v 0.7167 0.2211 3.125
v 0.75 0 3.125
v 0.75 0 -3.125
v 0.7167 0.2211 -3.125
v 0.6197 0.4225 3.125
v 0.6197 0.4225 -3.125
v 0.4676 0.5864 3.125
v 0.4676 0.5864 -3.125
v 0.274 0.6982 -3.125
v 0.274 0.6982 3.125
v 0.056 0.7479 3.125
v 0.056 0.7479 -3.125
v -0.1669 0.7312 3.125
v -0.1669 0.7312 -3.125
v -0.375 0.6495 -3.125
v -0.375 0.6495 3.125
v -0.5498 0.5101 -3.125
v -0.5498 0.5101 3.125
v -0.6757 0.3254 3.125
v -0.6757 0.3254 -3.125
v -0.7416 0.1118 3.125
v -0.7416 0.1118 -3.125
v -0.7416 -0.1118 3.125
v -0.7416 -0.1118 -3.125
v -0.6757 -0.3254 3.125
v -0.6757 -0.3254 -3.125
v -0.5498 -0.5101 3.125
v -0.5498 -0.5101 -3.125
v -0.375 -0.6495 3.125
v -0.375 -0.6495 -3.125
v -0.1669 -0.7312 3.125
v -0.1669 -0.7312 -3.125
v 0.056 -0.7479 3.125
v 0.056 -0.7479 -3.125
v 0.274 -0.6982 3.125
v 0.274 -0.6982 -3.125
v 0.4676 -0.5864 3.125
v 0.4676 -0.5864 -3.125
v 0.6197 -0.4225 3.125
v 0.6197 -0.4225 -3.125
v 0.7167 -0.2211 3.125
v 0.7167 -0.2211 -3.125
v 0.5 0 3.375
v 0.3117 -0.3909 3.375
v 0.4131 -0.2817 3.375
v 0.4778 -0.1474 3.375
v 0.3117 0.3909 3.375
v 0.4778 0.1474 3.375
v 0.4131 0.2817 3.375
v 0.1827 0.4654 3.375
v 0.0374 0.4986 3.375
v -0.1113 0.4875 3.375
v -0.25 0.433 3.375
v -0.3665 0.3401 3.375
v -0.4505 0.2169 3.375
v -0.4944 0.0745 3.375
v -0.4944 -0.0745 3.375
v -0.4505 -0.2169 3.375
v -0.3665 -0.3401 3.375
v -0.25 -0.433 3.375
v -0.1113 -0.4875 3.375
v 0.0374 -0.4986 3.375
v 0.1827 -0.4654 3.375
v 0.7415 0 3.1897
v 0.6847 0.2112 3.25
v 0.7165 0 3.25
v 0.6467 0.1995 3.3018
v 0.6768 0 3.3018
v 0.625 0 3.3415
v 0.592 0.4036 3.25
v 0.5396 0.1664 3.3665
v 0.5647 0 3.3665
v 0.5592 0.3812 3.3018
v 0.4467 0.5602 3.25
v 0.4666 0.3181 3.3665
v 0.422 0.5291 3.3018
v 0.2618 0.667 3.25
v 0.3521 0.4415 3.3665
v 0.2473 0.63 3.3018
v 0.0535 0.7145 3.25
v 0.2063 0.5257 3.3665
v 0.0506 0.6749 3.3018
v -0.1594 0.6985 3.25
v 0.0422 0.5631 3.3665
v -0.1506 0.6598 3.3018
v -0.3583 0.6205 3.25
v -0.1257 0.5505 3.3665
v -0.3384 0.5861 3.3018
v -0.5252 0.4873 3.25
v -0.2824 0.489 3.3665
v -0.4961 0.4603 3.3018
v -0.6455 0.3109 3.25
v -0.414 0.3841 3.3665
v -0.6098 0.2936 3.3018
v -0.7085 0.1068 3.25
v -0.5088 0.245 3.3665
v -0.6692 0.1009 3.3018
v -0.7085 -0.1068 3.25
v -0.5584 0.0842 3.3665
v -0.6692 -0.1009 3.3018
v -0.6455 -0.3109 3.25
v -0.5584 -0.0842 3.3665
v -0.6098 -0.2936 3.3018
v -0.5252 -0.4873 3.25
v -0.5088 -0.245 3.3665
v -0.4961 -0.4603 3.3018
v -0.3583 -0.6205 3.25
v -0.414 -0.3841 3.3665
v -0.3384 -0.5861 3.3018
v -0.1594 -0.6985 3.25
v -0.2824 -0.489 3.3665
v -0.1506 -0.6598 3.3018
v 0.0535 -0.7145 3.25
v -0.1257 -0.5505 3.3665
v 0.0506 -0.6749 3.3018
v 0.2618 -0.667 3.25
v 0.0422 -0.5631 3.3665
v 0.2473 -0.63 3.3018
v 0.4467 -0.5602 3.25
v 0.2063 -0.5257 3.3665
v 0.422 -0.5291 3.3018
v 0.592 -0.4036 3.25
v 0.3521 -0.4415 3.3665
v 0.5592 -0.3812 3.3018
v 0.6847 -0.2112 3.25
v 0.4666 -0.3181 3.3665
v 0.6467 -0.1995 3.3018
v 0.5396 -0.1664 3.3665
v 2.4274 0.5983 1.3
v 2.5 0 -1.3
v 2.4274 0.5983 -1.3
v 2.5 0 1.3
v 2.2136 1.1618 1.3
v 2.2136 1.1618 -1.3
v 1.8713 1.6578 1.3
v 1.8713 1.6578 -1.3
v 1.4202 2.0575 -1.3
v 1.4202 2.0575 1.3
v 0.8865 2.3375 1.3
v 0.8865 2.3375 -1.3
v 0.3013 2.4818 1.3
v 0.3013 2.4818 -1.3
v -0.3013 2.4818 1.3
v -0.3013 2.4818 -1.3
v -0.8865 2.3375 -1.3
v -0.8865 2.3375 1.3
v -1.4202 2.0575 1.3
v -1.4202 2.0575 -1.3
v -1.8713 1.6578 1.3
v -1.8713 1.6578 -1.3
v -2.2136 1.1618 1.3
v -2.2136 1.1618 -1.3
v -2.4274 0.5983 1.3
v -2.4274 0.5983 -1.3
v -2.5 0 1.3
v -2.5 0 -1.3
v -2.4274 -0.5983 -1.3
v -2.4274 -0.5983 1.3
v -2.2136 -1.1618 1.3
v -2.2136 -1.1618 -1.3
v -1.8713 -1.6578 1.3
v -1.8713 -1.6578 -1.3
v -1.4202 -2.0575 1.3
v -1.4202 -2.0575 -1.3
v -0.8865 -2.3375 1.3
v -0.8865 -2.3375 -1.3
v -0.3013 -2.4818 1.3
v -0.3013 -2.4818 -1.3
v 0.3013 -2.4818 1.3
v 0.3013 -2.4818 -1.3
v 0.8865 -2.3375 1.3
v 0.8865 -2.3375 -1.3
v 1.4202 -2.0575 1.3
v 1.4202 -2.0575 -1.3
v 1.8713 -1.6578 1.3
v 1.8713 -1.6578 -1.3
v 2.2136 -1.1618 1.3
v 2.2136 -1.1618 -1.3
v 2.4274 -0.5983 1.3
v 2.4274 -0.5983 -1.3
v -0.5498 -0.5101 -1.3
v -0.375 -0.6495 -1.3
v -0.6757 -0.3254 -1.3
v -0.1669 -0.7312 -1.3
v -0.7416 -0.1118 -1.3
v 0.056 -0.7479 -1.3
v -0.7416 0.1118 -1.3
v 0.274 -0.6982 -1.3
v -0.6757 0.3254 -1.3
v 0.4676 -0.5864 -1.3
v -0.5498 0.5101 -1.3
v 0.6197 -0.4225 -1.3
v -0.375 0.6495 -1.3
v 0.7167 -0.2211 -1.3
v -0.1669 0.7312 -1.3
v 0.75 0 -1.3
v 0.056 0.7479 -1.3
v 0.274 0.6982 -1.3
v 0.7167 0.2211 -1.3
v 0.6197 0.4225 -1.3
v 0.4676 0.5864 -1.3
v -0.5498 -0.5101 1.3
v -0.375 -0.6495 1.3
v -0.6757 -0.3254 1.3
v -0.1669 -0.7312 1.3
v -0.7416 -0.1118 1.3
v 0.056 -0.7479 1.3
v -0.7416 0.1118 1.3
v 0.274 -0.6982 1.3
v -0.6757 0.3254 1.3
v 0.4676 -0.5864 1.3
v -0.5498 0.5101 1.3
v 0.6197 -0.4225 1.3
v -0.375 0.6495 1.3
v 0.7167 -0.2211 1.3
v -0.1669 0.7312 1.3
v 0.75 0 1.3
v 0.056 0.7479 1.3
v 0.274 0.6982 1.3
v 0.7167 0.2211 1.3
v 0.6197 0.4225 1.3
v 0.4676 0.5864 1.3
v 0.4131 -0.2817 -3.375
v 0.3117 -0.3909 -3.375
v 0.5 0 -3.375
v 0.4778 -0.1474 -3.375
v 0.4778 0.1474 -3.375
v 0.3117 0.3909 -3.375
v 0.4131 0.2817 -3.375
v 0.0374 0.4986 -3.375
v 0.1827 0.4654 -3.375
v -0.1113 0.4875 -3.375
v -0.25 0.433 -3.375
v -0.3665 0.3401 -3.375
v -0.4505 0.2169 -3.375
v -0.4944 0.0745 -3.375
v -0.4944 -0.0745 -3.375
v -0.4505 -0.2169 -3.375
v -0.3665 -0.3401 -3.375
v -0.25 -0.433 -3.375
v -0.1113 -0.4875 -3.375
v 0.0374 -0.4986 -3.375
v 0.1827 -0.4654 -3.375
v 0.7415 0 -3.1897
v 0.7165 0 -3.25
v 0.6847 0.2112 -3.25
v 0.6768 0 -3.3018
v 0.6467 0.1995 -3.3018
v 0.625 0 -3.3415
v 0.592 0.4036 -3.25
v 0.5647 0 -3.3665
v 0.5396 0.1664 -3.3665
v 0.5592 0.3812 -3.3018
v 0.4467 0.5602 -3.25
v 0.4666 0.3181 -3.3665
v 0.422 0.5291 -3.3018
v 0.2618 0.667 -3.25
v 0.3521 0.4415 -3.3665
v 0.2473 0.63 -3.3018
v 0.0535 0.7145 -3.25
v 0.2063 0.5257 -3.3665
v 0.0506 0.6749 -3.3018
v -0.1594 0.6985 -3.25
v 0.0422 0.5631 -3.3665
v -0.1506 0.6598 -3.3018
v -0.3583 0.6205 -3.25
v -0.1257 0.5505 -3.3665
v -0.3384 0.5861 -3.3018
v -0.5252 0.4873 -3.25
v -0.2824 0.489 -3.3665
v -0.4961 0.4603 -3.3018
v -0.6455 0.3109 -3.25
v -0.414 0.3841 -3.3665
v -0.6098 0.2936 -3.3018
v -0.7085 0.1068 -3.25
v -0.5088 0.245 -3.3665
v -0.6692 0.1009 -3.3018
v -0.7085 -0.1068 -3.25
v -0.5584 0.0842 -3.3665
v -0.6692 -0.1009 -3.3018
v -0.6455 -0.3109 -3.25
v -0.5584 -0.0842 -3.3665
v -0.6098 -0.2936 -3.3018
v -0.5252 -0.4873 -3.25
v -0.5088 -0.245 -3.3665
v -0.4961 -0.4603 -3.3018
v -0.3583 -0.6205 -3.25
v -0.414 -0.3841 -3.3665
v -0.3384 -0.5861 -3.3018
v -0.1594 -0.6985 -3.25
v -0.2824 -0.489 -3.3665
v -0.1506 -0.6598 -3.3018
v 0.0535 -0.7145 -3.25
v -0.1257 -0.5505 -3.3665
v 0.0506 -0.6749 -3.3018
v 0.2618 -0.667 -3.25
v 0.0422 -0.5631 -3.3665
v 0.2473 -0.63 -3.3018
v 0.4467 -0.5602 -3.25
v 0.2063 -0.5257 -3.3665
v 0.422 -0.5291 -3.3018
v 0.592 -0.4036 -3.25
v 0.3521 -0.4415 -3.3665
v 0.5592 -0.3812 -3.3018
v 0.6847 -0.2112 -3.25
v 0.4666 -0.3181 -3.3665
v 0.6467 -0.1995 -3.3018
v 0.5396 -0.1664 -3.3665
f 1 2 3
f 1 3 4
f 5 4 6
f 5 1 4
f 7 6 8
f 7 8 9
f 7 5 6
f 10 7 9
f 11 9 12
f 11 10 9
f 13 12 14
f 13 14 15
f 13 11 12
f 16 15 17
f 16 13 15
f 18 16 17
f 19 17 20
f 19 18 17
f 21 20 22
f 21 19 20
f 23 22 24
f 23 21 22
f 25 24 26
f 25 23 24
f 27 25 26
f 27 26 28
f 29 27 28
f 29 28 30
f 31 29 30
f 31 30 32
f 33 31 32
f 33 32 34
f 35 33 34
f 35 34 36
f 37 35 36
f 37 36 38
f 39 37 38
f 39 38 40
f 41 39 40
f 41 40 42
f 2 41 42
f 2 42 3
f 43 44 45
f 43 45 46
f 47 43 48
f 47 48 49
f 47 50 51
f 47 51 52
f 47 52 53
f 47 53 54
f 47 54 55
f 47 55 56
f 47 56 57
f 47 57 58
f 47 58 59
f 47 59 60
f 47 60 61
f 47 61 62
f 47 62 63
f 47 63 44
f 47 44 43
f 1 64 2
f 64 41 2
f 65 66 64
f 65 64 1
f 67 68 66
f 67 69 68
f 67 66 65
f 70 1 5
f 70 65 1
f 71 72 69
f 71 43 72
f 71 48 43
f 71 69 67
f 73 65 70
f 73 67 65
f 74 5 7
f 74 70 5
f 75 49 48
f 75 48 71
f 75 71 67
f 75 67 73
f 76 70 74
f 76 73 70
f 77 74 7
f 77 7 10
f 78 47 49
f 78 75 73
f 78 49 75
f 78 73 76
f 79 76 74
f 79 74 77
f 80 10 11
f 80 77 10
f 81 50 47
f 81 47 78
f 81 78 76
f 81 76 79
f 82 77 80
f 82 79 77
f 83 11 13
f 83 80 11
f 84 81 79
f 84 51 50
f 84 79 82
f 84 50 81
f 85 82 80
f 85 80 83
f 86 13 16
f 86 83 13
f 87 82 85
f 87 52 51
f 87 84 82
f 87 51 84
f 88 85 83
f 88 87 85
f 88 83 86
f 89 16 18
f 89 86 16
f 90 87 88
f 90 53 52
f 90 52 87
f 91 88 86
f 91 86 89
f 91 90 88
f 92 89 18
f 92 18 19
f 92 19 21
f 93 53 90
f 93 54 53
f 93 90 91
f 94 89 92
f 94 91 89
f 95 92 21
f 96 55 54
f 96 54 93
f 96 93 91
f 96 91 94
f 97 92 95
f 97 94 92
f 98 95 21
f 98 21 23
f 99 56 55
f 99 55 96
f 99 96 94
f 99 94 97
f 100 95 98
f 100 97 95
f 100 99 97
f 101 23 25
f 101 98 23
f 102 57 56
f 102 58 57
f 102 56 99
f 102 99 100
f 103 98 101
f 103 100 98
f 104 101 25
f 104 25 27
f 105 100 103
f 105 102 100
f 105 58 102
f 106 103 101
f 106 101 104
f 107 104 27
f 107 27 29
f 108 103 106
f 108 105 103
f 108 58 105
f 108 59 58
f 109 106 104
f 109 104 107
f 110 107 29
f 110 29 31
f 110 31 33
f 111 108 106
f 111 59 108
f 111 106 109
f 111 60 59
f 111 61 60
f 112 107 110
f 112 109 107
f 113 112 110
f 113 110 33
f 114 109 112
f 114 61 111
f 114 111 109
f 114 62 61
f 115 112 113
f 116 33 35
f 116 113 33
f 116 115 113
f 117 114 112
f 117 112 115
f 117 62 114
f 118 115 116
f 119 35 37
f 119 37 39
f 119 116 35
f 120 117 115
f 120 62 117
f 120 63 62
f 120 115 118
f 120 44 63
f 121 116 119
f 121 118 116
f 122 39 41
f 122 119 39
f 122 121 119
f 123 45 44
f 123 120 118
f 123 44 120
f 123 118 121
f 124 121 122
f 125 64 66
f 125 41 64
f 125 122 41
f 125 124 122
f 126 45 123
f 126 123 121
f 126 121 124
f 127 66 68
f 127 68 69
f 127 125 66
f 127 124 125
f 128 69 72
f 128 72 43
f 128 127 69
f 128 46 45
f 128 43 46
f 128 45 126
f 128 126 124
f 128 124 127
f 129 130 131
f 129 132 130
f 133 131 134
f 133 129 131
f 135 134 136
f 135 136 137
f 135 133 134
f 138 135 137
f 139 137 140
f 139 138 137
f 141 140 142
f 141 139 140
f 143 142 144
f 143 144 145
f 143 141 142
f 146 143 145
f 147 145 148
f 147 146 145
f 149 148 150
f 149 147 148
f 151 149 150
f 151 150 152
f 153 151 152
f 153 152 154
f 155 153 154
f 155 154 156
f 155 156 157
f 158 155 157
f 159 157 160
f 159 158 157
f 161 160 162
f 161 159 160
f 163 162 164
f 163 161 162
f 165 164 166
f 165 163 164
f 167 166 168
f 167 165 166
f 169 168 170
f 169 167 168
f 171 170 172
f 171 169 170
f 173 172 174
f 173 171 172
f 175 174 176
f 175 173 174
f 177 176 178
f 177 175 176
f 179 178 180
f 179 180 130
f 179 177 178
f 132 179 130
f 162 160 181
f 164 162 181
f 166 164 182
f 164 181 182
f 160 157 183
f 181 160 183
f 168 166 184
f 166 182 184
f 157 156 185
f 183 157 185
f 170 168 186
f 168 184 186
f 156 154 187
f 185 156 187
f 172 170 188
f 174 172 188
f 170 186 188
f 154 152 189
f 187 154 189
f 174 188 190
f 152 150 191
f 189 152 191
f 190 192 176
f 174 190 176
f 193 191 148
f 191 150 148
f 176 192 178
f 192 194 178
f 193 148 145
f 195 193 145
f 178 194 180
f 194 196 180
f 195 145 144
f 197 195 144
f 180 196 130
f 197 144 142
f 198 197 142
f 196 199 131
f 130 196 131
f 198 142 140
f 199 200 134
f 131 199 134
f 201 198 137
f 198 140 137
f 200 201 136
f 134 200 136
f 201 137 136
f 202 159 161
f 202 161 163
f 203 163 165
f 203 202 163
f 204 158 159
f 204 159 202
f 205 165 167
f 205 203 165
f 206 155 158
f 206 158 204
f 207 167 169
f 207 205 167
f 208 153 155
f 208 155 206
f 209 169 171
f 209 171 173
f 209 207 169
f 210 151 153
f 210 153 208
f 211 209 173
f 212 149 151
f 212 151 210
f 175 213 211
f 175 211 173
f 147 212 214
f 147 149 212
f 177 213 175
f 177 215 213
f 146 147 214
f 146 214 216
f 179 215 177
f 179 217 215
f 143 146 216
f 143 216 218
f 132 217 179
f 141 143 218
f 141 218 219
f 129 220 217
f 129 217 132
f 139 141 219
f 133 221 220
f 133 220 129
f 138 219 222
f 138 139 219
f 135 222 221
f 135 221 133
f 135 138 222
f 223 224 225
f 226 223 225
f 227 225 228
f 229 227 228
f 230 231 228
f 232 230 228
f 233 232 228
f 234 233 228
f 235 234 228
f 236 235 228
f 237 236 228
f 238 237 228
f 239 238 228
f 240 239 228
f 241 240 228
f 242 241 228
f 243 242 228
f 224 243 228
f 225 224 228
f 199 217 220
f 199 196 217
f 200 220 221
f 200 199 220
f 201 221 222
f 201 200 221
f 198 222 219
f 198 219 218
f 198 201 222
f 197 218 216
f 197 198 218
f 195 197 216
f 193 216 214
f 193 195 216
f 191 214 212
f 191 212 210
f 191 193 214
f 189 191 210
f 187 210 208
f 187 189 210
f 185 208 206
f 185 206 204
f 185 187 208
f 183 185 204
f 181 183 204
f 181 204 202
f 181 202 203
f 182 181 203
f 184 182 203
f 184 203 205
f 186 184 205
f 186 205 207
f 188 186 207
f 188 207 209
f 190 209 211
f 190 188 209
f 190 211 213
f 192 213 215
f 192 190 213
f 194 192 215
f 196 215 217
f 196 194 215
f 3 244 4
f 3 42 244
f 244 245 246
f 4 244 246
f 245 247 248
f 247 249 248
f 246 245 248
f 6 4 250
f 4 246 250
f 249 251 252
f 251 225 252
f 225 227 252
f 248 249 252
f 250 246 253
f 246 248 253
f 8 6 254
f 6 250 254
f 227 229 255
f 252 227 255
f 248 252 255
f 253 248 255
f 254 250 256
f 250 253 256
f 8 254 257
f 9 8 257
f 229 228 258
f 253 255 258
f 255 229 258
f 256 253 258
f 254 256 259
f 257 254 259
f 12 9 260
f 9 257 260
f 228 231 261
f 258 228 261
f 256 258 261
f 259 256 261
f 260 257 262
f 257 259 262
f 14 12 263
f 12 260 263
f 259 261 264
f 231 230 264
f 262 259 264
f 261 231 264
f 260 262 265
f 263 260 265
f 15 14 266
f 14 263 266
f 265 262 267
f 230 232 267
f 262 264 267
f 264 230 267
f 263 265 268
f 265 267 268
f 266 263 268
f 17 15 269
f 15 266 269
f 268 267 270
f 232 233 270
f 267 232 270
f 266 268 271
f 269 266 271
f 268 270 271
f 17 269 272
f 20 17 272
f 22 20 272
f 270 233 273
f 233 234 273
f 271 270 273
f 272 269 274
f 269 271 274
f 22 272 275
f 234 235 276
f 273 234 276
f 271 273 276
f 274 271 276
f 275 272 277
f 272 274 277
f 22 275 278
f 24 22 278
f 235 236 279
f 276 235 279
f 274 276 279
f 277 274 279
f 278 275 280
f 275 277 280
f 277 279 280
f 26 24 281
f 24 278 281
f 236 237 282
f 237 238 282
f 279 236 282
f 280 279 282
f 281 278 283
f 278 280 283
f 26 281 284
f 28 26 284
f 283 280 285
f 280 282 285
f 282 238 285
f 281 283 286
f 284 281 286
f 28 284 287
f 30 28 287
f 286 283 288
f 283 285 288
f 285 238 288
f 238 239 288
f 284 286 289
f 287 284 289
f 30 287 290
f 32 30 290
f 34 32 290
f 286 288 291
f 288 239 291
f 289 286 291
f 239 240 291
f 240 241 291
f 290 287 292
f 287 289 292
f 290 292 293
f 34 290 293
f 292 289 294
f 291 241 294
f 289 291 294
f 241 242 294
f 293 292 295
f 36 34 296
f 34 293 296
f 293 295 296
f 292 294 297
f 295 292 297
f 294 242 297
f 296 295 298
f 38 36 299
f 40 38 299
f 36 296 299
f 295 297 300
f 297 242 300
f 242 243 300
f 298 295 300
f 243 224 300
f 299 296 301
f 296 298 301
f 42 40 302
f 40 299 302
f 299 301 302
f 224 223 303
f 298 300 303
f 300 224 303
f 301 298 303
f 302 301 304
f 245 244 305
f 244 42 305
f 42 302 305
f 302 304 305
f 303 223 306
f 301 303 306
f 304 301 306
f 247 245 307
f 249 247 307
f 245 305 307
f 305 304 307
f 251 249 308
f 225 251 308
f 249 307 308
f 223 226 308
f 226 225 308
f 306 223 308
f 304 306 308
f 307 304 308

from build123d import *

# Parameters (mm, degrees)
F0_R     = 2.5
F0_R_2   = 0.75
F1_DEPTH = 1.3
F2_R     = 0.75
F3_DEPTH = 3.375
F4_R     = 0.25


with BuildPart() as f1:
    # F0 (on Top) → F1 (new body, symmetric)
    with BuildSketch(Plane.XY):
        Circle(F0_R)
        Circle(F0_R_2, mode=Mode.SUBTRACT)
    extrude(amount=F1_DEPTH, both=True)


with BuildPart() as f3:
    # F2 (on Top) → F3 (new body, symmetric)
    with BuildSketch(Plane.XY):
        Circle(F2_R)
    extrude(amount=F3_DEPTH, both=True)

    # F4
    f4_edges = [f3.edges().sort_by_distance(p)[0] for p in [
        (-0.75, 0, -3.375),
        (-0.75, 0, 3.375),
    ]]
    fillet(f4_edges, radius=F4_R)


solid = Compound([f1.part, f3.part])
